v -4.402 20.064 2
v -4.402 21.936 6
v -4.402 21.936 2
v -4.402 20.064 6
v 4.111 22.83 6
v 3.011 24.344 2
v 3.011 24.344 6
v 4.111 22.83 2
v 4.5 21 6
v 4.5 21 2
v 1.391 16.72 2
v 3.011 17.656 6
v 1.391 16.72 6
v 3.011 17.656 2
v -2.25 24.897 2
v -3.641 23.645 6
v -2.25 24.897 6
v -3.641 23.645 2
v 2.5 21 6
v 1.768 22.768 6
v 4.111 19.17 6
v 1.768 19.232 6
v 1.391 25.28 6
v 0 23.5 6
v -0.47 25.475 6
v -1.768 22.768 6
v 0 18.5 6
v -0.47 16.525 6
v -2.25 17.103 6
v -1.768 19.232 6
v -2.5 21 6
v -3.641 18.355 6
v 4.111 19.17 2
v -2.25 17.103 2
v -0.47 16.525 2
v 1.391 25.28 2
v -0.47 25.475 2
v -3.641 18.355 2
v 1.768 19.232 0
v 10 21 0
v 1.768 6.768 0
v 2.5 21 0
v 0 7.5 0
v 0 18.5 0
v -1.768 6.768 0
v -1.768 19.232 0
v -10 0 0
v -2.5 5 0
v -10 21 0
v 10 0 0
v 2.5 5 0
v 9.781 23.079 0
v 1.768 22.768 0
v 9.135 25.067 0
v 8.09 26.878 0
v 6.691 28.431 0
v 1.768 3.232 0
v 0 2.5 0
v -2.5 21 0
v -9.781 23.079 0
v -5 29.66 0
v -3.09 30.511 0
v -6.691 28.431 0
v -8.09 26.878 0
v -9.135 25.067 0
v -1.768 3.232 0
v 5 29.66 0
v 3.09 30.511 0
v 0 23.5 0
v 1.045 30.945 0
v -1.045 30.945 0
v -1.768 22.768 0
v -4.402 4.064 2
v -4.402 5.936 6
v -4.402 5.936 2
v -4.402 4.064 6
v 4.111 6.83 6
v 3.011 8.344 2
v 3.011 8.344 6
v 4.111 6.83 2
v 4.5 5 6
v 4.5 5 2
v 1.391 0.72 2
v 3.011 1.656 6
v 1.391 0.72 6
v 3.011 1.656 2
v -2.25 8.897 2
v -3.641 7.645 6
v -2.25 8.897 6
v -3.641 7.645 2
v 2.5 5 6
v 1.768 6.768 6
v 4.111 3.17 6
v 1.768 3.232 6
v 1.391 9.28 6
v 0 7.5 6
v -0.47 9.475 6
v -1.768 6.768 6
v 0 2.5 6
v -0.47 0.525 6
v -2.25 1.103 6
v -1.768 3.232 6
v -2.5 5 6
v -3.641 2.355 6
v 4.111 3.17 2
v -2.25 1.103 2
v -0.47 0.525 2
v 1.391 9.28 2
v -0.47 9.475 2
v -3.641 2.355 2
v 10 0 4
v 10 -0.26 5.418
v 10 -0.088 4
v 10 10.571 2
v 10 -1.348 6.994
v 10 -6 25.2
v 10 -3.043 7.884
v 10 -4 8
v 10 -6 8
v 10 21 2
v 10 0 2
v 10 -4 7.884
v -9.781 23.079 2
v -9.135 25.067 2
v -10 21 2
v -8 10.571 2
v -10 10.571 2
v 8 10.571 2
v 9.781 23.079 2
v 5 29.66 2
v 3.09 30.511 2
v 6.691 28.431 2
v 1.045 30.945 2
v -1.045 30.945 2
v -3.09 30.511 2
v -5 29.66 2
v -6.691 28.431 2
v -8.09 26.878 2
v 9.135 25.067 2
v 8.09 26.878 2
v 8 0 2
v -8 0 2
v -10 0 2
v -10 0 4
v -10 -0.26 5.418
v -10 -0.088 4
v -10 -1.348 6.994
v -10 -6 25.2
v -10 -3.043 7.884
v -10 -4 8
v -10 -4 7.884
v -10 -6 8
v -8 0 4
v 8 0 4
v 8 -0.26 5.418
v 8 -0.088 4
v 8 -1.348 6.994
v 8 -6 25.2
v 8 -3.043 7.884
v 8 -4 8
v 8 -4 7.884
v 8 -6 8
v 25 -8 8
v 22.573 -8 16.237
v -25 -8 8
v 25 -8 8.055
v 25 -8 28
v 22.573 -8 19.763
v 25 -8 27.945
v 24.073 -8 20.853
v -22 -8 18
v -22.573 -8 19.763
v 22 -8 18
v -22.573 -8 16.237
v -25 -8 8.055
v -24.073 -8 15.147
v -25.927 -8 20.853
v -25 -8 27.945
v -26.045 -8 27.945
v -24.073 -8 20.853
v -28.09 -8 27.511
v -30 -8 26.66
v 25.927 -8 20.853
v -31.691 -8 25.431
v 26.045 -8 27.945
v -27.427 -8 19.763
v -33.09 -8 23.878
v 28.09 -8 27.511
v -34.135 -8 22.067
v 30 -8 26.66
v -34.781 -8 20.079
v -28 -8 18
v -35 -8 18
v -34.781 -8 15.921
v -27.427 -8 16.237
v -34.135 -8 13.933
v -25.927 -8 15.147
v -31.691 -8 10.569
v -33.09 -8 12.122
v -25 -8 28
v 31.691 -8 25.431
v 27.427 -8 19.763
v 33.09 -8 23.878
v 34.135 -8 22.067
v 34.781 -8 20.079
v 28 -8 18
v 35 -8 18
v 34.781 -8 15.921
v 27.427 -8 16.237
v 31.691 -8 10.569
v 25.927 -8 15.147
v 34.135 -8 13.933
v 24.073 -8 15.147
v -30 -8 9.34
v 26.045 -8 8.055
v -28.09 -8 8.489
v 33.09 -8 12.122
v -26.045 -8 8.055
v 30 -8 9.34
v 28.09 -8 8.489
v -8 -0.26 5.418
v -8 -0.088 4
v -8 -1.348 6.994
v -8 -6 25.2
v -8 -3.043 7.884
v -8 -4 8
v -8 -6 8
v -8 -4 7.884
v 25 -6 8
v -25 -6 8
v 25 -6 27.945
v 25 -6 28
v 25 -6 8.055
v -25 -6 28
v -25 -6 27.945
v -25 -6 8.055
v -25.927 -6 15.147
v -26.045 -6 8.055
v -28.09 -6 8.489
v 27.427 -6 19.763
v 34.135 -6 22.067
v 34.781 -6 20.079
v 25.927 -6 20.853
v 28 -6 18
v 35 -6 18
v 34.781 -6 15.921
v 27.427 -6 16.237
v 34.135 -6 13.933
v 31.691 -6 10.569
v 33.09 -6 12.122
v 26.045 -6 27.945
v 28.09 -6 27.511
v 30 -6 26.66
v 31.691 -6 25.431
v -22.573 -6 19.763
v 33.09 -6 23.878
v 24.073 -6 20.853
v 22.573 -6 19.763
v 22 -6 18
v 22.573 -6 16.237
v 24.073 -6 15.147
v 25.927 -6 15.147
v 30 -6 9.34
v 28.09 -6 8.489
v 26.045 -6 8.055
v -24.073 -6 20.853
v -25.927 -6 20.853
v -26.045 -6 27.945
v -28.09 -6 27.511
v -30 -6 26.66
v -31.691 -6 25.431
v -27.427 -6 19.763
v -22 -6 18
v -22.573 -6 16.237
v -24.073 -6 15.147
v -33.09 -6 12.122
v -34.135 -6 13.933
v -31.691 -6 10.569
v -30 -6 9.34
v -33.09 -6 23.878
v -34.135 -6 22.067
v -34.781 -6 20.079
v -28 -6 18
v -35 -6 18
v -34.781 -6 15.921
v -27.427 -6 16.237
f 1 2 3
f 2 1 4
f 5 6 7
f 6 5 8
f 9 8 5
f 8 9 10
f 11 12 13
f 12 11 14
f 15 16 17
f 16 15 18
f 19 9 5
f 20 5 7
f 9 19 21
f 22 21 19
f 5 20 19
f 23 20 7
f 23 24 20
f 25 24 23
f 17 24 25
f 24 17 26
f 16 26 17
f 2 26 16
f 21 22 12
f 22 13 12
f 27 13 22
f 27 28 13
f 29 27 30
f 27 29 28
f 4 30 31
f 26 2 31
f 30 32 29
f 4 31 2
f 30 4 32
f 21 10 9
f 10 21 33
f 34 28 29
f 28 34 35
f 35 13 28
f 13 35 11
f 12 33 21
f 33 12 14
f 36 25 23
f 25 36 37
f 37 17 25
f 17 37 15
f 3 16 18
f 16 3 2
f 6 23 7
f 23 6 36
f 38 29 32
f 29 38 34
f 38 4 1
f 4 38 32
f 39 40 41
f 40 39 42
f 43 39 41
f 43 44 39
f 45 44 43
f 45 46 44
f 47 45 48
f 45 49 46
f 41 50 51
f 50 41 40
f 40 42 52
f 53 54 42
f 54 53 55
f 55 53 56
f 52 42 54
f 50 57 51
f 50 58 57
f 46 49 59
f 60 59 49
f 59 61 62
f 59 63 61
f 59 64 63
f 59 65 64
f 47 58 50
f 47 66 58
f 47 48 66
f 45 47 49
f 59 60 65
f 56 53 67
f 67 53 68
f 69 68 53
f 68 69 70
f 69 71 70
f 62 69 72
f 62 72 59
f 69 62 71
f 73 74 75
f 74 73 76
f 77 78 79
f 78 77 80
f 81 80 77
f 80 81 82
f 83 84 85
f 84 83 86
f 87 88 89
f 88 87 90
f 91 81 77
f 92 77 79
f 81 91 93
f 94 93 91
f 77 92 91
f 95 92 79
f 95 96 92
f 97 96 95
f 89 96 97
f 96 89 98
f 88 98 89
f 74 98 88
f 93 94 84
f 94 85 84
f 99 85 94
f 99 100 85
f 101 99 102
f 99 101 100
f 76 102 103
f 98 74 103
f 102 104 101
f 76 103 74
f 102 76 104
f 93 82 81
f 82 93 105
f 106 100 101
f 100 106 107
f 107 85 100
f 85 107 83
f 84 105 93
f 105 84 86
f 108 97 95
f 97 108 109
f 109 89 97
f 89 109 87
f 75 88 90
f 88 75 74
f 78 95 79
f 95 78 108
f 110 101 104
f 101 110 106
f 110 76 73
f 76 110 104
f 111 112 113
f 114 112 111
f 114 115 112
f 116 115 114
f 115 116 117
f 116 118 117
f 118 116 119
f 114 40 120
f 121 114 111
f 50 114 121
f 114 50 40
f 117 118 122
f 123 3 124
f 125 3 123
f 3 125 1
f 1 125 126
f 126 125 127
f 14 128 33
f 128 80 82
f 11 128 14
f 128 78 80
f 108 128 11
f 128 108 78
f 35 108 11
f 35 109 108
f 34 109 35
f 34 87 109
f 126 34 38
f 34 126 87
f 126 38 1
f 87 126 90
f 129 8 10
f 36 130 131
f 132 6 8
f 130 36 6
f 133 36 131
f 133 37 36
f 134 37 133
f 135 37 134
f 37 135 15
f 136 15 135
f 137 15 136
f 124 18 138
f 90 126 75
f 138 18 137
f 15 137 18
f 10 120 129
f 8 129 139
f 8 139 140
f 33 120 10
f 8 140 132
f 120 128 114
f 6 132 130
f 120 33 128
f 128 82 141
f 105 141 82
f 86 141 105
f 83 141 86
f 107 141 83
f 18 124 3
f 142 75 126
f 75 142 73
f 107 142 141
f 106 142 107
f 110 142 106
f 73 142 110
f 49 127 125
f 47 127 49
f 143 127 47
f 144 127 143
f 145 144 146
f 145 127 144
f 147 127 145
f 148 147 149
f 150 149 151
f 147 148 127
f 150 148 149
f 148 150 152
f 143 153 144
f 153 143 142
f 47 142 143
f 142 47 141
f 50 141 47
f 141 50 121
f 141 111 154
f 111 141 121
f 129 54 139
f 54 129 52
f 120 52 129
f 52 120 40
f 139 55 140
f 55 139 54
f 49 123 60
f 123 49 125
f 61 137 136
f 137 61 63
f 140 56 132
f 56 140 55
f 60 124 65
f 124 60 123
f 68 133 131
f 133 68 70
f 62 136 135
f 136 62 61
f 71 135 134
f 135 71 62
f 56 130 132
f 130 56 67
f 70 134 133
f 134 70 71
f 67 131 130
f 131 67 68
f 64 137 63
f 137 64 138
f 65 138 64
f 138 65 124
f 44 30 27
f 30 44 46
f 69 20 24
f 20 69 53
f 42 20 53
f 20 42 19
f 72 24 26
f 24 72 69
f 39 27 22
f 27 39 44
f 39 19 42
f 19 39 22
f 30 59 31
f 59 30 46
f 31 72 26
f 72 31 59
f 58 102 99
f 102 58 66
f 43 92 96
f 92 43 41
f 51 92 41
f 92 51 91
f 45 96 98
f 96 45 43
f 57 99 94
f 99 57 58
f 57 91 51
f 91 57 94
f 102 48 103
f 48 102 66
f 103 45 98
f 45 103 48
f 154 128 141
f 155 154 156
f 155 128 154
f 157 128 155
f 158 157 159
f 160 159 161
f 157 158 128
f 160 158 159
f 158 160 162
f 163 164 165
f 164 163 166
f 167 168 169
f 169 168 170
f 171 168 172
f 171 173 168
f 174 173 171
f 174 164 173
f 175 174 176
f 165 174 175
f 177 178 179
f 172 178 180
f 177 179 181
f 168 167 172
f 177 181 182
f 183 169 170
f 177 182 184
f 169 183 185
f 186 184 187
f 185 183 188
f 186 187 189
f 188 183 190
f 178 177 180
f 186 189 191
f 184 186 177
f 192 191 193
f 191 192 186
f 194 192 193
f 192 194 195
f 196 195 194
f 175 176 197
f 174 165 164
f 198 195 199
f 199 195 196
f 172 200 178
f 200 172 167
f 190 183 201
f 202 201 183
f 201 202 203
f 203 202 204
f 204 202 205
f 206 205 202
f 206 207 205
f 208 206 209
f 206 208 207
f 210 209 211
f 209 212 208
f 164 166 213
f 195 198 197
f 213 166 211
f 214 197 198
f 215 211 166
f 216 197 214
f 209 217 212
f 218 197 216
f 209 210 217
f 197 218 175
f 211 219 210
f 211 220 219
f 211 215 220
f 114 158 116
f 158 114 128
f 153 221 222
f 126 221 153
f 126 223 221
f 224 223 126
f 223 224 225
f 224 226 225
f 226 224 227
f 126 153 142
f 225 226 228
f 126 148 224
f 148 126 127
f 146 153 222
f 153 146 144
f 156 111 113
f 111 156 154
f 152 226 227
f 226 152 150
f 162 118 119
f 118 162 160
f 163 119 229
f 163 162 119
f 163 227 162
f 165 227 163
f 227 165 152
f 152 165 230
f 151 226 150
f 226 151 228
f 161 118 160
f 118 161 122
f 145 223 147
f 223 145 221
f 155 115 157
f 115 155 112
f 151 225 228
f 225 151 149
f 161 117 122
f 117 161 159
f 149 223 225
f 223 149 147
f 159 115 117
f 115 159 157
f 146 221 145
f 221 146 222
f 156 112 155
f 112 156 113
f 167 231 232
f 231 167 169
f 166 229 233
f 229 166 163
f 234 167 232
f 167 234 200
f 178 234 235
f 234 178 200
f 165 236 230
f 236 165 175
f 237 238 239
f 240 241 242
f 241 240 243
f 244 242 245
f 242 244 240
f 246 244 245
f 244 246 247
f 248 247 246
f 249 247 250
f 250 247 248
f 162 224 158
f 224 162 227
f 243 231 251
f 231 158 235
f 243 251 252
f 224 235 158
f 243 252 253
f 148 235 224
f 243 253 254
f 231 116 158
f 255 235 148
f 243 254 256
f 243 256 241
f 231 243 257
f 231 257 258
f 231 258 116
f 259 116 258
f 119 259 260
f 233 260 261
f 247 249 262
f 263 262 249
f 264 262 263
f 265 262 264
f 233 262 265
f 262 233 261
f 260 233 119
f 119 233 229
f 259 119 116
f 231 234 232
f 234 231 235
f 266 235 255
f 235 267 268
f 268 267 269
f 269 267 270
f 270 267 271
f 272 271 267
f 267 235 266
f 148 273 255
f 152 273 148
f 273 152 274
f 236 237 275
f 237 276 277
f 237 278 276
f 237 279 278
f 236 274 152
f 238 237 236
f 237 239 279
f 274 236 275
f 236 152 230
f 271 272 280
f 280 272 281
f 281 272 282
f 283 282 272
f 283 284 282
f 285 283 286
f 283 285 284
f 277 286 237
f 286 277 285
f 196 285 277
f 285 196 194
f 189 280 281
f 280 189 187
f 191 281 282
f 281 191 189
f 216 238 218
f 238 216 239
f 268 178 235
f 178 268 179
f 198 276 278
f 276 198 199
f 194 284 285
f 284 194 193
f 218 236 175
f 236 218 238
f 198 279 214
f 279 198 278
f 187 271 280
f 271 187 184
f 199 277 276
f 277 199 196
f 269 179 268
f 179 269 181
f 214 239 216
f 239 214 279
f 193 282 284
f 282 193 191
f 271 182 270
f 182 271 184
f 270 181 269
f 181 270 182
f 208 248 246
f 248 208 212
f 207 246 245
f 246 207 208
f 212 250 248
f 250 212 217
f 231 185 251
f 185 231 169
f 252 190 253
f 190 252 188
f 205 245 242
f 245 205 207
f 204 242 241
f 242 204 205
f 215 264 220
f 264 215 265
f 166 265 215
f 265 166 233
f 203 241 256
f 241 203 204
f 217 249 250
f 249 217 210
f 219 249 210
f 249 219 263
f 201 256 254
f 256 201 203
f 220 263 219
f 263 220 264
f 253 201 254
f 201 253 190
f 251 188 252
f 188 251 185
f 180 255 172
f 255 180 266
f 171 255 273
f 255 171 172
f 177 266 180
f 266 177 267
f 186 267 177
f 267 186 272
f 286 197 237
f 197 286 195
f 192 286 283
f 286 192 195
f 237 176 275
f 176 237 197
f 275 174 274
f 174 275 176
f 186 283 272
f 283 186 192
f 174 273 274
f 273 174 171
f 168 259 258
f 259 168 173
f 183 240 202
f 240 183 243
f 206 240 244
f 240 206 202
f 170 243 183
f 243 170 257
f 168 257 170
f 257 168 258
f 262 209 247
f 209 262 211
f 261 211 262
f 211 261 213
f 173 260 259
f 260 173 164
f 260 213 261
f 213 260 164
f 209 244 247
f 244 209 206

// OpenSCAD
module wedge(thickness, depth, height) {
	rotate(a=90, v=[0,1,0]) {
		linear_extrude(height=thickness) {
			polygon(
				points = [[0,0],[-height,0],[0,depth]]
			);
		}
	}
}

module hole(r, h, rota, rotv, position) {
	translate(position) {
		rotate(a = rota, v = rotv) {
			cylinder(h = h, r = r, center = true);
		}
	}
}

// Overall thickness
thickness = 2;
// Rack plate parameters
rackPlateWidth = 20;
rackPlateLength = 21;
rackPlate2HolePos = 5;
rackScrewHoleRadius = 2.5;
rackScrewWellDepth = 4;
wedgeDepth = 20;
overhangHeight = 8;
overhangDepth = 8;
rackBarRadius = 4;
// Light plate parameters
lightPlateWidth = 20;
lightPlateLength = 50;
lightScrewHoleRadius = 3;
lightScrewWellDepth = 0;

module rackPlate() {
	difference() {
		union() {
			translate([-rackPlateWidth/2, 0, 0]) {
				cube([rackPlateWidth, rackPlateLength, thickness]);
			}
			translate([0, rackPlateLength, 0]) {
				cylinder(h=thickness, r=rackPlateWidth/2);
			}
			if (rackScrewWellDepth > 0) {
				translate([0, rackPlateLength, 0]) {
					cylinder(h=thickness+rackScrewWellDepth, r=rackScrewHoleRadius+thickness);
				}
				translate([0, rackPlate2HolePos, 0]) {
					cylinder(h=thickness+rackScrewWellDepth, r=rackScrewHoleRadius+thickness);
				}
			}
		}
		hole(rackScrewHoleRadius, thickness * 2 + rackScrewWellDepth, 0, [1,0,0], [0, rackPlateLength, (thickness+rackScrewWellDepth)/2]);
		hole(rackScrewHoleRadius, thickness * 2 + rackScrewWellDepth, 0, [1,0,0], [0, rackPlate2HolePos, (thickness+rackScrewWellDepth)/2]);
	}
}

module connector() {
	difference() {
		union() {
			translate([(rackPlateWidth / 2) - thickness, -overhangDepth, 0]) {
				wedge(thickness, wedgeDepth, overhangHeight + lightPlateWidth);
			}
			translate([-rackPlateWidth / 2, -overhangDepth, 0]) {
				wedge(thickness, wedgeDepth, overhangHeight + lightPlateWidth);
			}
		}
		translate([-(rackPlateWidth+2)/2,-(overhangDepth+1),-1]) {
			cube([rackPlateWidth+2, overhangDepth+1, overhangHeight-rackBarRadius+1]);
		}
		translate([-(rackPlateWidth+2)/2,-(overhangDepth+1),overhangHeight-(rackBarRadius+1)]) {
			cube([rackPlateWidth+2, overhangDepth-rackBarRadius+1,rackBarRadius+1]);
		}
		translate([0, -rackBarRadius, overhangHeight-rackBarRadius]) {
			rotate(a=90, v=[0,1,0]) {
				cylinder(r=rackBarRadius, h=rackPlateWidth+2, center=true);
			}
		}
	}
}

module lightPlate() {
	difference() {
		union() {
			translate([-lightPlateLength/2, -overhangDepth, overhangHeight]) {
				cube([lightPlateLength, thickness, lightPlateWidth]);
			}
			translate([-lightPlateLength/2, -overhangDepth, overhangHeight+lightPlateWidth/2]) {
				rotate(a=-90, v=[1,0,0]) {
					cylinder(r=lightPlateWidth/2, h=thickness);
				}
			}
			translate([lightPlateLength/2, -overhangDepth, overhangHeight+lightPlateWidth/2]) {
				rotate(a=-90, v=[1,0,0]) {
					cylinder(r=lightPlateWidth/2, h=thickness);
				}
			}
			if (lightScrewWellDepth > 0) {
				translate([-lightPlateLength/2, -overhangDepth, overhangHeight+lightPlateWidth/2]) {
					rotate(a=-90, v=[1,0,0]) {
						cylinder(h=thickness+lightScrewWellDepth, r=lightScrewHoleRadius+thickness);
					}
				}
				translate([lightPlateLength/2, -overhangDepth, overhangHeight+lightPlateWidth/2]) {
					rotate(a=-90, v=[1,0,0]) {
						cylinder(h=thickness+lightScrewWellDepth, r=lightScrewHoleRadius+thickness);
					}
				}
			}
		}
		hole(lightScrewHoleRadius, thickness * 2 + lightScrewWellDepth, 90, [1,0,0], [-lightPlateLength/2, -overhangDepth + (thickness+lightScrewWellDepth)/2, overhangHeight+lightPlateWidth/2]);
		hole(lightScrewHoleRadius, thickness * 2 + lightScrewWellDepth, 90, [1,0,0], [ lightPlateLength/2, -overhangDepth + (thickness+lightScrewWellDepth)/2, overhangHeight+lightPlateWidth/2]);
	}
}

union() {
	rackPlate();
	connector();
	lightPlate();
}
